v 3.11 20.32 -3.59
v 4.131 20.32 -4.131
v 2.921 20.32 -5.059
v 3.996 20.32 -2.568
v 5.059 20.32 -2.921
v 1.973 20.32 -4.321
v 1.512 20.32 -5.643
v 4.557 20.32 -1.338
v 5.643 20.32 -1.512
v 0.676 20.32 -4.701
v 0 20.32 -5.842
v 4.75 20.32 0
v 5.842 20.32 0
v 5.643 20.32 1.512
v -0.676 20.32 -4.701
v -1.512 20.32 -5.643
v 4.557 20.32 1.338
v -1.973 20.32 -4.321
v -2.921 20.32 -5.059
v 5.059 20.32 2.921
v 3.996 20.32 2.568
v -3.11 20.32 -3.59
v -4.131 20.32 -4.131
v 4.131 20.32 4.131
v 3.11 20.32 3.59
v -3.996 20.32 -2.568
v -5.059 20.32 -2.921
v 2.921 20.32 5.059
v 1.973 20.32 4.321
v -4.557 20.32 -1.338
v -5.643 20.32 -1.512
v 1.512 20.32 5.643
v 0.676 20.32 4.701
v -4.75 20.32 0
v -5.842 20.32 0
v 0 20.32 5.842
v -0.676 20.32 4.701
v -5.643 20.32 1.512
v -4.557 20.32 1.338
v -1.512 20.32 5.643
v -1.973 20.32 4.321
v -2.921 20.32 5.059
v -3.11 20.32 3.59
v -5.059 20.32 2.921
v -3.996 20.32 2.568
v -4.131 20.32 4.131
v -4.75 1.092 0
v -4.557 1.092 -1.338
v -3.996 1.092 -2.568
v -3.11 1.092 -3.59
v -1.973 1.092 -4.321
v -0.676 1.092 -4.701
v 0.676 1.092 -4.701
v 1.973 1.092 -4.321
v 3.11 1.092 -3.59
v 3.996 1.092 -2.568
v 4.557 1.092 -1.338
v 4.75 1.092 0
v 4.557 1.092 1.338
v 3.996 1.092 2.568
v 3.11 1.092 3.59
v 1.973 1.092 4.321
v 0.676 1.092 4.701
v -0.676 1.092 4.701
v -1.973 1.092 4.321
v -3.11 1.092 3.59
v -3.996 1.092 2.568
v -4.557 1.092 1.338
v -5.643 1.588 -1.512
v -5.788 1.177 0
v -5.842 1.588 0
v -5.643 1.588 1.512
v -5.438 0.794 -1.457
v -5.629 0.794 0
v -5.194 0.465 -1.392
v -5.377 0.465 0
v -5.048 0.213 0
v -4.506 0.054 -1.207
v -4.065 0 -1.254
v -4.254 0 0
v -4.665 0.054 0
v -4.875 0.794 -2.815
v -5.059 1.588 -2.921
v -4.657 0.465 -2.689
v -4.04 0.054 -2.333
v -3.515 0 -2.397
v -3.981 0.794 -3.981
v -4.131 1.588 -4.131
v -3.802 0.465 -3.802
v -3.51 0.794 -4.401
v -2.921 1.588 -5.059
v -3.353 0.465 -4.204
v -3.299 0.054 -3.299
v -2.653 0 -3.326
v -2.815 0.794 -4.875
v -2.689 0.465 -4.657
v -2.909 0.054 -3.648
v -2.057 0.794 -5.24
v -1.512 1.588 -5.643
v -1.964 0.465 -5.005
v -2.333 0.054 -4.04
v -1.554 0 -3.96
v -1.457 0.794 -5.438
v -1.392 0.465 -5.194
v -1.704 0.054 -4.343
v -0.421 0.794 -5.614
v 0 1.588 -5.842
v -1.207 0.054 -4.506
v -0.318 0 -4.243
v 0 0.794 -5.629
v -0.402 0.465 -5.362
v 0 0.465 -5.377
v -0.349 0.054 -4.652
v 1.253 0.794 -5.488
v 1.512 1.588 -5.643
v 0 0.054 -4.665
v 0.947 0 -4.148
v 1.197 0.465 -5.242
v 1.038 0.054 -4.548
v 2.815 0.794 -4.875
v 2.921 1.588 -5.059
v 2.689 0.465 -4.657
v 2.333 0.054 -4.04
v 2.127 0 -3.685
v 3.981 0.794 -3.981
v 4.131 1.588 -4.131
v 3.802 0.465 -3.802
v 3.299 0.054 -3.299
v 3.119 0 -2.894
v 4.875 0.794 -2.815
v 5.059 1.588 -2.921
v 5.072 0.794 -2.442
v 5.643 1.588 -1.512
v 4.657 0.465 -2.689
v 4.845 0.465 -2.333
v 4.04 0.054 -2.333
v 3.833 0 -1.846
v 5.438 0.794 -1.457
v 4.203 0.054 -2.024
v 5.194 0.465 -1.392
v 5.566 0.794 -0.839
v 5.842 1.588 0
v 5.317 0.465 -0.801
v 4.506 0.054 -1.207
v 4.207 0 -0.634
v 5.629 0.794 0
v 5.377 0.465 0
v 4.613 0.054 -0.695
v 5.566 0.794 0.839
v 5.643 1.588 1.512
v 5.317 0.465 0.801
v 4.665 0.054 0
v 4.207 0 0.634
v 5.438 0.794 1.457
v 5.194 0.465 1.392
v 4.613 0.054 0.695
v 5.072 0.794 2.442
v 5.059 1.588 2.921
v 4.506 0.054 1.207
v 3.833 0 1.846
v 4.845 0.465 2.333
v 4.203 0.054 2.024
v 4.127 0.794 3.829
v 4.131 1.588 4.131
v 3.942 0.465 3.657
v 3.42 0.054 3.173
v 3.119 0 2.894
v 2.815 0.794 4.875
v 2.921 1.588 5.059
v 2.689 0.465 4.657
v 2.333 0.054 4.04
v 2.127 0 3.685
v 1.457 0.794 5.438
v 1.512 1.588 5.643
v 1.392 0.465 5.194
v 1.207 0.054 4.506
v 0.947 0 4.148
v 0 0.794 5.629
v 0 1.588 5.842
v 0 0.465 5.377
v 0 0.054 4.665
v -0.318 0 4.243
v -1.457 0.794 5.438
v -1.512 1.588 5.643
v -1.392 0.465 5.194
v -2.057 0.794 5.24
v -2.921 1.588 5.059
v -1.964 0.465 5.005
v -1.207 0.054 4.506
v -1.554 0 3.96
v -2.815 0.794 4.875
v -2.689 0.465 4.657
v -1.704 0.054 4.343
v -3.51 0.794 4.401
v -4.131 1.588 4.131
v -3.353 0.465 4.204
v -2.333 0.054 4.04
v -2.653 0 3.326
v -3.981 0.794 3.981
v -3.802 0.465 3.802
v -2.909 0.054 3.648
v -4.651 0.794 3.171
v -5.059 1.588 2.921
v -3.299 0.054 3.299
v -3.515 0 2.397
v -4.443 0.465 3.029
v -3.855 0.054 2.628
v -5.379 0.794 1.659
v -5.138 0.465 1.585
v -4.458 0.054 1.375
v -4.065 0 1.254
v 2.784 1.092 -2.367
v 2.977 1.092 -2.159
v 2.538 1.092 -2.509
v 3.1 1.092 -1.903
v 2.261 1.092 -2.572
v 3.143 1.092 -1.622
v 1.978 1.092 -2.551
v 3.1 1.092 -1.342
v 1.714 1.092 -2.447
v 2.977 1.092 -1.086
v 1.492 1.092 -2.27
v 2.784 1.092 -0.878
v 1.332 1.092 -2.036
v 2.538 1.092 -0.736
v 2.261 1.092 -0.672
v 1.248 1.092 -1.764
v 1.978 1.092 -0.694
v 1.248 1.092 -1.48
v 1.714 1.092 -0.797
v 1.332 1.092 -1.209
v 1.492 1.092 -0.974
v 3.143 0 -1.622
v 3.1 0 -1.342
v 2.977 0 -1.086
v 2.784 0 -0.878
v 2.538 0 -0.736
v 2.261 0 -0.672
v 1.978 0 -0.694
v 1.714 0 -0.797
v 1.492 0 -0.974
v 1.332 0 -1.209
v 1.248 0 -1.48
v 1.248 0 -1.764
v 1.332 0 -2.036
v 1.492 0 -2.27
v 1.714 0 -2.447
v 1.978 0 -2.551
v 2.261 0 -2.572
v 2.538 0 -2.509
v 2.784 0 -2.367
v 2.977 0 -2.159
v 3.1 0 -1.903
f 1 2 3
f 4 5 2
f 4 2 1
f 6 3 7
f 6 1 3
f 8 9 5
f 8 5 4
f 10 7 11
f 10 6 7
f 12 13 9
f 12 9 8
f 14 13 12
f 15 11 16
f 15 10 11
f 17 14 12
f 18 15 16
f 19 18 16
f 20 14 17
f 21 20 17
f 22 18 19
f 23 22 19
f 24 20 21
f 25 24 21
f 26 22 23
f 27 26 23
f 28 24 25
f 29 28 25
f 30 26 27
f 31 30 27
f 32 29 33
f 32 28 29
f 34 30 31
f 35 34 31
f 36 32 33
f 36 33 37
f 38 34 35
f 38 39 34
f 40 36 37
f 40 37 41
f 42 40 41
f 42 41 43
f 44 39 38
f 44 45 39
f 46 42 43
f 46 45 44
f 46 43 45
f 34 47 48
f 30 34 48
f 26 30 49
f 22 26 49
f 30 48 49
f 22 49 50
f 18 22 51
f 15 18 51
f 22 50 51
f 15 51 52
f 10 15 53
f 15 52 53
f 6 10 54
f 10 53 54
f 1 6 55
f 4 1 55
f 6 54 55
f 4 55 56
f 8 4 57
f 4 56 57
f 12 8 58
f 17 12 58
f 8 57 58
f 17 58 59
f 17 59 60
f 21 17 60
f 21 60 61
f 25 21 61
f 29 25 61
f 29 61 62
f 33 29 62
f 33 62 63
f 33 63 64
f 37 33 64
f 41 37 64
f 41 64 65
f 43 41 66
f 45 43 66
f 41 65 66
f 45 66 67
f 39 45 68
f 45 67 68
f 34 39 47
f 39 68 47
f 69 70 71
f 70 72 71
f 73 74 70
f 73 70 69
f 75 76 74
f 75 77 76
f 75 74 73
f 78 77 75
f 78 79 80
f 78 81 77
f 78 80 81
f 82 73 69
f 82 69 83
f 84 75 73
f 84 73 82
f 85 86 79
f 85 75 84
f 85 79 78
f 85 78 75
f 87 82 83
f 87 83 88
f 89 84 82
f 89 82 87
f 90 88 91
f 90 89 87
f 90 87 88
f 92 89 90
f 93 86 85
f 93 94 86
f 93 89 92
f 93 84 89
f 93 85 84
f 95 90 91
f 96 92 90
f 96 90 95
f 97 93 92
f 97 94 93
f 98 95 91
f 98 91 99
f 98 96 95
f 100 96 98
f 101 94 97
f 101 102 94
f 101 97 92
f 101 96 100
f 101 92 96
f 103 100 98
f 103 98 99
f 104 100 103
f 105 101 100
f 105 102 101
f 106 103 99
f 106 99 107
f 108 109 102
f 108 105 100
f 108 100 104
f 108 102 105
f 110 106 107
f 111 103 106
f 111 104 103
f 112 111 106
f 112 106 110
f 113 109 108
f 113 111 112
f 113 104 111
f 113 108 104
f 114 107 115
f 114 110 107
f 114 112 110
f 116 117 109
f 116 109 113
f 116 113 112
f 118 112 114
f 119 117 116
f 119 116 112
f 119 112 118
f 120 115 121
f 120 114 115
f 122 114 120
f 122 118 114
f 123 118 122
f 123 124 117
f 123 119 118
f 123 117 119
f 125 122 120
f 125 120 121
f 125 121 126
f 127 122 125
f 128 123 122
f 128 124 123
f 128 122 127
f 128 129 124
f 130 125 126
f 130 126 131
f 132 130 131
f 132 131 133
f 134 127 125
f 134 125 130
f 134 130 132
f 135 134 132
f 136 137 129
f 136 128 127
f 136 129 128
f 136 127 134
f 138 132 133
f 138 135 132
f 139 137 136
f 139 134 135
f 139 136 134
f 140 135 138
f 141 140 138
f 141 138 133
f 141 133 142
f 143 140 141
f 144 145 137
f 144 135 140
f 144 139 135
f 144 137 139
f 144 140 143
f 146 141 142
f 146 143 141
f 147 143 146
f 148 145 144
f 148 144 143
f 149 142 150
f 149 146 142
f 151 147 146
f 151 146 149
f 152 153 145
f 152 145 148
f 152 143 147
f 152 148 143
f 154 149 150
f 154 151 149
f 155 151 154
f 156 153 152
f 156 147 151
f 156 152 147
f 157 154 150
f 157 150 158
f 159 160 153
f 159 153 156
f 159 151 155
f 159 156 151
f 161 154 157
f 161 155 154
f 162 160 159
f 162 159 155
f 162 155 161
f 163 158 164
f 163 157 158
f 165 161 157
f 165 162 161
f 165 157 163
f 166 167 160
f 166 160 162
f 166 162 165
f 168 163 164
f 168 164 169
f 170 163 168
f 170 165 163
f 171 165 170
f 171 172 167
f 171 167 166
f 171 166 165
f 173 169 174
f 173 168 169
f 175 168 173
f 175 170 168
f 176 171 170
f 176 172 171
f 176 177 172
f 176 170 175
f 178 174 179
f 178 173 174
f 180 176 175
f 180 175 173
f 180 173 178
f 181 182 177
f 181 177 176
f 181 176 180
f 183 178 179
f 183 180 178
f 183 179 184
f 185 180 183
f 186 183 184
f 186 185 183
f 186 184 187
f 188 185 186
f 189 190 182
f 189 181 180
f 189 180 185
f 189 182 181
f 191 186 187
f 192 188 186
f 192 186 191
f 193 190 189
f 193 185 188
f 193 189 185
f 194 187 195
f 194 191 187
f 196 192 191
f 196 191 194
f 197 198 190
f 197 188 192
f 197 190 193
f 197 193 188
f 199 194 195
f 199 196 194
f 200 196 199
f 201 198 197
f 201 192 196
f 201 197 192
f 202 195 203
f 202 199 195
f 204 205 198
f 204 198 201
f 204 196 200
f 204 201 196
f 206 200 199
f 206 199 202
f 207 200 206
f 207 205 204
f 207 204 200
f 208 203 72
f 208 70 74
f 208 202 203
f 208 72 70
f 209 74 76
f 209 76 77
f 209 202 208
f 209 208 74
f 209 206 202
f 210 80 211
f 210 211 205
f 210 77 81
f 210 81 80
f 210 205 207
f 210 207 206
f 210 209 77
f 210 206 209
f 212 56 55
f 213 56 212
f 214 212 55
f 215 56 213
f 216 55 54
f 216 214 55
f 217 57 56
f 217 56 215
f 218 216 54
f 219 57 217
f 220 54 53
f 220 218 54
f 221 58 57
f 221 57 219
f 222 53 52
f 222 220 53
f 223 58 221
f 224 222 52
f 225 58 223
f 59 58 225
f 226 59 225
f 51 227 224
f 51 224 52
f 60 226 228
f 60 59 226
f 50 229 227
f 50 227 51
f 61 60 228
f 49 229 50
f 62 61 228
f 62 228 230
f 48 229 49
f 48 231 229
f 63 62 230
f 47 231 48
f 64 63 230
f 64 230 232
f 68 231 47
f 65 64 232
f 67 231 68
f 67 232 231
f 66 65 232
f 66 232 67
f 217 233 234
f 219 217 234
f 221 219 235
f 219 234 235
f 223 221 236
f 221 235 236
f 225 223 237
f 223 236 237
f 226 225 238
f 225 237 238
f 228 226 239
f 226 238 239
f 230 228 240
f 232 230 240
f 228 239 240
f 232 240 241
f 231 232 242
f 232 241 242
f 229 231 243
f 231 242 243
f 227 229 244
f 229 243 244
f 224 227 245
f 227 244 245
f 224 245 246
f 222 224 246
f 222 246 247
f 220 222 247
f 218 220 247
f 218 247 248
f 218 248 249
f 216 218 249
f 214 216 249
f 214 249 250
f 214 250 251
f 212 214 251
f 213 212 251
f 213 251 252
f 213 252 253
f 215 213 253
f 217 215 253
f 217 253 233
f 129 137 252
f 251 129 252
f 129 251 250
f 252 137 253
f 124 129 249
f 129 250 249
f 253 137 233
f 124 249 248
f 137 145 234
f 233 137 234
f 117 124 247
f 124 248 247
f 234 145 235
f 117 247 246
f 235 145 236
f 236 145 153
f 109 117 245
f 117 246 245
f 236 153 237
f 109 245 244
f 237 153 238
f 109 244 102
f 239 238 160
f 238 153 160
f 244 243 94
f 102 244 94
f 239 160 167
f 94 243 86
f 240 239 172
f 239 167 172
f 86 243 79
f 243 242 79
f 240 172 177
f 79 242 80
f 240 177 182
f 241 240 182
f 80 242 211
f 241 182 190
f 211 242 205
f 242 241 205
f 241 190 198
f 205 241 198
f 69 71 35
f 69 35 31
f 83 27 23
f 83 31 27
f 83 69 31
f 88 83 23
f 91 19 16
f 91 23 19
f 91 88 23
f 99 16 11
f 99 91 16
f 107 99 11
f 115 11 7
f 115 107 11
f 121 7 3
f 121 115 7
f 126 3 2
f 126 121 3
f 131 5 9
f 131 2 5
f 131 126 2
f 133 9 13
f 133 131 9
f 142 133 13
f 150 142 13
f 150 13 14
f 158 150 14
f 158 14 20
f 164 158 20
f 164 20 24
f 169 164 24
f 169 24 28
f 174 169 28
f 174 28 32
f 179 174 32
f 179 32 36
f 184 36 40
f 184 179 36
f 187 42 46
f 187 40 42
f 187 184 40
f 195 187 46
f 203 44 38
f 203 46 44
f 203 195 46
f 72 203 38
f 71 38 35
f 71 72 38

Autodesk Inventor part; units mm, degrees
ref_plane "YZ Plane" through (0, 0, 0) normal (1, 0, 0) x (0, 1, 0)
ref_plane "XZ Plane" through (0, 0, 0) normal (0, 1, 0) x (-1, 0, 0)
ref_plane "XY Plane" through (0, 0, 0) normal (0, 0, 1) x (1, 0, 0)
sketch "Sketch1" plane through (0, 0, 0) normal (0, 1, 0) x (-1, 0, 0)
  circle A0 centre (0, 0) radius 5.842
  dimension "d0" = 11.684
extrude "Extrusion1" add sketch "Sketch1" along normal blind 20.32
shell "Shell1" thickness 1.0922 removed faces 1 at (-0.5241, 20.32, 1.3818)
fillet "Fillet1" radius 1.5875 1 edges at (5.842, 0, 0)
sketch "Sketch2" plane through (0, 0, 0) normal (0, -1, 0) x (1, 0, 0)
  circle A0 centre (2.1901, -1.6223) radius 0.9525
  point P0 (0, 0)
  dimension "d5" = 1.905
extrude "Extrusion2" cut sketch "Sketch2" against normal through all
properties part number "bottun tube" material "Glass"
